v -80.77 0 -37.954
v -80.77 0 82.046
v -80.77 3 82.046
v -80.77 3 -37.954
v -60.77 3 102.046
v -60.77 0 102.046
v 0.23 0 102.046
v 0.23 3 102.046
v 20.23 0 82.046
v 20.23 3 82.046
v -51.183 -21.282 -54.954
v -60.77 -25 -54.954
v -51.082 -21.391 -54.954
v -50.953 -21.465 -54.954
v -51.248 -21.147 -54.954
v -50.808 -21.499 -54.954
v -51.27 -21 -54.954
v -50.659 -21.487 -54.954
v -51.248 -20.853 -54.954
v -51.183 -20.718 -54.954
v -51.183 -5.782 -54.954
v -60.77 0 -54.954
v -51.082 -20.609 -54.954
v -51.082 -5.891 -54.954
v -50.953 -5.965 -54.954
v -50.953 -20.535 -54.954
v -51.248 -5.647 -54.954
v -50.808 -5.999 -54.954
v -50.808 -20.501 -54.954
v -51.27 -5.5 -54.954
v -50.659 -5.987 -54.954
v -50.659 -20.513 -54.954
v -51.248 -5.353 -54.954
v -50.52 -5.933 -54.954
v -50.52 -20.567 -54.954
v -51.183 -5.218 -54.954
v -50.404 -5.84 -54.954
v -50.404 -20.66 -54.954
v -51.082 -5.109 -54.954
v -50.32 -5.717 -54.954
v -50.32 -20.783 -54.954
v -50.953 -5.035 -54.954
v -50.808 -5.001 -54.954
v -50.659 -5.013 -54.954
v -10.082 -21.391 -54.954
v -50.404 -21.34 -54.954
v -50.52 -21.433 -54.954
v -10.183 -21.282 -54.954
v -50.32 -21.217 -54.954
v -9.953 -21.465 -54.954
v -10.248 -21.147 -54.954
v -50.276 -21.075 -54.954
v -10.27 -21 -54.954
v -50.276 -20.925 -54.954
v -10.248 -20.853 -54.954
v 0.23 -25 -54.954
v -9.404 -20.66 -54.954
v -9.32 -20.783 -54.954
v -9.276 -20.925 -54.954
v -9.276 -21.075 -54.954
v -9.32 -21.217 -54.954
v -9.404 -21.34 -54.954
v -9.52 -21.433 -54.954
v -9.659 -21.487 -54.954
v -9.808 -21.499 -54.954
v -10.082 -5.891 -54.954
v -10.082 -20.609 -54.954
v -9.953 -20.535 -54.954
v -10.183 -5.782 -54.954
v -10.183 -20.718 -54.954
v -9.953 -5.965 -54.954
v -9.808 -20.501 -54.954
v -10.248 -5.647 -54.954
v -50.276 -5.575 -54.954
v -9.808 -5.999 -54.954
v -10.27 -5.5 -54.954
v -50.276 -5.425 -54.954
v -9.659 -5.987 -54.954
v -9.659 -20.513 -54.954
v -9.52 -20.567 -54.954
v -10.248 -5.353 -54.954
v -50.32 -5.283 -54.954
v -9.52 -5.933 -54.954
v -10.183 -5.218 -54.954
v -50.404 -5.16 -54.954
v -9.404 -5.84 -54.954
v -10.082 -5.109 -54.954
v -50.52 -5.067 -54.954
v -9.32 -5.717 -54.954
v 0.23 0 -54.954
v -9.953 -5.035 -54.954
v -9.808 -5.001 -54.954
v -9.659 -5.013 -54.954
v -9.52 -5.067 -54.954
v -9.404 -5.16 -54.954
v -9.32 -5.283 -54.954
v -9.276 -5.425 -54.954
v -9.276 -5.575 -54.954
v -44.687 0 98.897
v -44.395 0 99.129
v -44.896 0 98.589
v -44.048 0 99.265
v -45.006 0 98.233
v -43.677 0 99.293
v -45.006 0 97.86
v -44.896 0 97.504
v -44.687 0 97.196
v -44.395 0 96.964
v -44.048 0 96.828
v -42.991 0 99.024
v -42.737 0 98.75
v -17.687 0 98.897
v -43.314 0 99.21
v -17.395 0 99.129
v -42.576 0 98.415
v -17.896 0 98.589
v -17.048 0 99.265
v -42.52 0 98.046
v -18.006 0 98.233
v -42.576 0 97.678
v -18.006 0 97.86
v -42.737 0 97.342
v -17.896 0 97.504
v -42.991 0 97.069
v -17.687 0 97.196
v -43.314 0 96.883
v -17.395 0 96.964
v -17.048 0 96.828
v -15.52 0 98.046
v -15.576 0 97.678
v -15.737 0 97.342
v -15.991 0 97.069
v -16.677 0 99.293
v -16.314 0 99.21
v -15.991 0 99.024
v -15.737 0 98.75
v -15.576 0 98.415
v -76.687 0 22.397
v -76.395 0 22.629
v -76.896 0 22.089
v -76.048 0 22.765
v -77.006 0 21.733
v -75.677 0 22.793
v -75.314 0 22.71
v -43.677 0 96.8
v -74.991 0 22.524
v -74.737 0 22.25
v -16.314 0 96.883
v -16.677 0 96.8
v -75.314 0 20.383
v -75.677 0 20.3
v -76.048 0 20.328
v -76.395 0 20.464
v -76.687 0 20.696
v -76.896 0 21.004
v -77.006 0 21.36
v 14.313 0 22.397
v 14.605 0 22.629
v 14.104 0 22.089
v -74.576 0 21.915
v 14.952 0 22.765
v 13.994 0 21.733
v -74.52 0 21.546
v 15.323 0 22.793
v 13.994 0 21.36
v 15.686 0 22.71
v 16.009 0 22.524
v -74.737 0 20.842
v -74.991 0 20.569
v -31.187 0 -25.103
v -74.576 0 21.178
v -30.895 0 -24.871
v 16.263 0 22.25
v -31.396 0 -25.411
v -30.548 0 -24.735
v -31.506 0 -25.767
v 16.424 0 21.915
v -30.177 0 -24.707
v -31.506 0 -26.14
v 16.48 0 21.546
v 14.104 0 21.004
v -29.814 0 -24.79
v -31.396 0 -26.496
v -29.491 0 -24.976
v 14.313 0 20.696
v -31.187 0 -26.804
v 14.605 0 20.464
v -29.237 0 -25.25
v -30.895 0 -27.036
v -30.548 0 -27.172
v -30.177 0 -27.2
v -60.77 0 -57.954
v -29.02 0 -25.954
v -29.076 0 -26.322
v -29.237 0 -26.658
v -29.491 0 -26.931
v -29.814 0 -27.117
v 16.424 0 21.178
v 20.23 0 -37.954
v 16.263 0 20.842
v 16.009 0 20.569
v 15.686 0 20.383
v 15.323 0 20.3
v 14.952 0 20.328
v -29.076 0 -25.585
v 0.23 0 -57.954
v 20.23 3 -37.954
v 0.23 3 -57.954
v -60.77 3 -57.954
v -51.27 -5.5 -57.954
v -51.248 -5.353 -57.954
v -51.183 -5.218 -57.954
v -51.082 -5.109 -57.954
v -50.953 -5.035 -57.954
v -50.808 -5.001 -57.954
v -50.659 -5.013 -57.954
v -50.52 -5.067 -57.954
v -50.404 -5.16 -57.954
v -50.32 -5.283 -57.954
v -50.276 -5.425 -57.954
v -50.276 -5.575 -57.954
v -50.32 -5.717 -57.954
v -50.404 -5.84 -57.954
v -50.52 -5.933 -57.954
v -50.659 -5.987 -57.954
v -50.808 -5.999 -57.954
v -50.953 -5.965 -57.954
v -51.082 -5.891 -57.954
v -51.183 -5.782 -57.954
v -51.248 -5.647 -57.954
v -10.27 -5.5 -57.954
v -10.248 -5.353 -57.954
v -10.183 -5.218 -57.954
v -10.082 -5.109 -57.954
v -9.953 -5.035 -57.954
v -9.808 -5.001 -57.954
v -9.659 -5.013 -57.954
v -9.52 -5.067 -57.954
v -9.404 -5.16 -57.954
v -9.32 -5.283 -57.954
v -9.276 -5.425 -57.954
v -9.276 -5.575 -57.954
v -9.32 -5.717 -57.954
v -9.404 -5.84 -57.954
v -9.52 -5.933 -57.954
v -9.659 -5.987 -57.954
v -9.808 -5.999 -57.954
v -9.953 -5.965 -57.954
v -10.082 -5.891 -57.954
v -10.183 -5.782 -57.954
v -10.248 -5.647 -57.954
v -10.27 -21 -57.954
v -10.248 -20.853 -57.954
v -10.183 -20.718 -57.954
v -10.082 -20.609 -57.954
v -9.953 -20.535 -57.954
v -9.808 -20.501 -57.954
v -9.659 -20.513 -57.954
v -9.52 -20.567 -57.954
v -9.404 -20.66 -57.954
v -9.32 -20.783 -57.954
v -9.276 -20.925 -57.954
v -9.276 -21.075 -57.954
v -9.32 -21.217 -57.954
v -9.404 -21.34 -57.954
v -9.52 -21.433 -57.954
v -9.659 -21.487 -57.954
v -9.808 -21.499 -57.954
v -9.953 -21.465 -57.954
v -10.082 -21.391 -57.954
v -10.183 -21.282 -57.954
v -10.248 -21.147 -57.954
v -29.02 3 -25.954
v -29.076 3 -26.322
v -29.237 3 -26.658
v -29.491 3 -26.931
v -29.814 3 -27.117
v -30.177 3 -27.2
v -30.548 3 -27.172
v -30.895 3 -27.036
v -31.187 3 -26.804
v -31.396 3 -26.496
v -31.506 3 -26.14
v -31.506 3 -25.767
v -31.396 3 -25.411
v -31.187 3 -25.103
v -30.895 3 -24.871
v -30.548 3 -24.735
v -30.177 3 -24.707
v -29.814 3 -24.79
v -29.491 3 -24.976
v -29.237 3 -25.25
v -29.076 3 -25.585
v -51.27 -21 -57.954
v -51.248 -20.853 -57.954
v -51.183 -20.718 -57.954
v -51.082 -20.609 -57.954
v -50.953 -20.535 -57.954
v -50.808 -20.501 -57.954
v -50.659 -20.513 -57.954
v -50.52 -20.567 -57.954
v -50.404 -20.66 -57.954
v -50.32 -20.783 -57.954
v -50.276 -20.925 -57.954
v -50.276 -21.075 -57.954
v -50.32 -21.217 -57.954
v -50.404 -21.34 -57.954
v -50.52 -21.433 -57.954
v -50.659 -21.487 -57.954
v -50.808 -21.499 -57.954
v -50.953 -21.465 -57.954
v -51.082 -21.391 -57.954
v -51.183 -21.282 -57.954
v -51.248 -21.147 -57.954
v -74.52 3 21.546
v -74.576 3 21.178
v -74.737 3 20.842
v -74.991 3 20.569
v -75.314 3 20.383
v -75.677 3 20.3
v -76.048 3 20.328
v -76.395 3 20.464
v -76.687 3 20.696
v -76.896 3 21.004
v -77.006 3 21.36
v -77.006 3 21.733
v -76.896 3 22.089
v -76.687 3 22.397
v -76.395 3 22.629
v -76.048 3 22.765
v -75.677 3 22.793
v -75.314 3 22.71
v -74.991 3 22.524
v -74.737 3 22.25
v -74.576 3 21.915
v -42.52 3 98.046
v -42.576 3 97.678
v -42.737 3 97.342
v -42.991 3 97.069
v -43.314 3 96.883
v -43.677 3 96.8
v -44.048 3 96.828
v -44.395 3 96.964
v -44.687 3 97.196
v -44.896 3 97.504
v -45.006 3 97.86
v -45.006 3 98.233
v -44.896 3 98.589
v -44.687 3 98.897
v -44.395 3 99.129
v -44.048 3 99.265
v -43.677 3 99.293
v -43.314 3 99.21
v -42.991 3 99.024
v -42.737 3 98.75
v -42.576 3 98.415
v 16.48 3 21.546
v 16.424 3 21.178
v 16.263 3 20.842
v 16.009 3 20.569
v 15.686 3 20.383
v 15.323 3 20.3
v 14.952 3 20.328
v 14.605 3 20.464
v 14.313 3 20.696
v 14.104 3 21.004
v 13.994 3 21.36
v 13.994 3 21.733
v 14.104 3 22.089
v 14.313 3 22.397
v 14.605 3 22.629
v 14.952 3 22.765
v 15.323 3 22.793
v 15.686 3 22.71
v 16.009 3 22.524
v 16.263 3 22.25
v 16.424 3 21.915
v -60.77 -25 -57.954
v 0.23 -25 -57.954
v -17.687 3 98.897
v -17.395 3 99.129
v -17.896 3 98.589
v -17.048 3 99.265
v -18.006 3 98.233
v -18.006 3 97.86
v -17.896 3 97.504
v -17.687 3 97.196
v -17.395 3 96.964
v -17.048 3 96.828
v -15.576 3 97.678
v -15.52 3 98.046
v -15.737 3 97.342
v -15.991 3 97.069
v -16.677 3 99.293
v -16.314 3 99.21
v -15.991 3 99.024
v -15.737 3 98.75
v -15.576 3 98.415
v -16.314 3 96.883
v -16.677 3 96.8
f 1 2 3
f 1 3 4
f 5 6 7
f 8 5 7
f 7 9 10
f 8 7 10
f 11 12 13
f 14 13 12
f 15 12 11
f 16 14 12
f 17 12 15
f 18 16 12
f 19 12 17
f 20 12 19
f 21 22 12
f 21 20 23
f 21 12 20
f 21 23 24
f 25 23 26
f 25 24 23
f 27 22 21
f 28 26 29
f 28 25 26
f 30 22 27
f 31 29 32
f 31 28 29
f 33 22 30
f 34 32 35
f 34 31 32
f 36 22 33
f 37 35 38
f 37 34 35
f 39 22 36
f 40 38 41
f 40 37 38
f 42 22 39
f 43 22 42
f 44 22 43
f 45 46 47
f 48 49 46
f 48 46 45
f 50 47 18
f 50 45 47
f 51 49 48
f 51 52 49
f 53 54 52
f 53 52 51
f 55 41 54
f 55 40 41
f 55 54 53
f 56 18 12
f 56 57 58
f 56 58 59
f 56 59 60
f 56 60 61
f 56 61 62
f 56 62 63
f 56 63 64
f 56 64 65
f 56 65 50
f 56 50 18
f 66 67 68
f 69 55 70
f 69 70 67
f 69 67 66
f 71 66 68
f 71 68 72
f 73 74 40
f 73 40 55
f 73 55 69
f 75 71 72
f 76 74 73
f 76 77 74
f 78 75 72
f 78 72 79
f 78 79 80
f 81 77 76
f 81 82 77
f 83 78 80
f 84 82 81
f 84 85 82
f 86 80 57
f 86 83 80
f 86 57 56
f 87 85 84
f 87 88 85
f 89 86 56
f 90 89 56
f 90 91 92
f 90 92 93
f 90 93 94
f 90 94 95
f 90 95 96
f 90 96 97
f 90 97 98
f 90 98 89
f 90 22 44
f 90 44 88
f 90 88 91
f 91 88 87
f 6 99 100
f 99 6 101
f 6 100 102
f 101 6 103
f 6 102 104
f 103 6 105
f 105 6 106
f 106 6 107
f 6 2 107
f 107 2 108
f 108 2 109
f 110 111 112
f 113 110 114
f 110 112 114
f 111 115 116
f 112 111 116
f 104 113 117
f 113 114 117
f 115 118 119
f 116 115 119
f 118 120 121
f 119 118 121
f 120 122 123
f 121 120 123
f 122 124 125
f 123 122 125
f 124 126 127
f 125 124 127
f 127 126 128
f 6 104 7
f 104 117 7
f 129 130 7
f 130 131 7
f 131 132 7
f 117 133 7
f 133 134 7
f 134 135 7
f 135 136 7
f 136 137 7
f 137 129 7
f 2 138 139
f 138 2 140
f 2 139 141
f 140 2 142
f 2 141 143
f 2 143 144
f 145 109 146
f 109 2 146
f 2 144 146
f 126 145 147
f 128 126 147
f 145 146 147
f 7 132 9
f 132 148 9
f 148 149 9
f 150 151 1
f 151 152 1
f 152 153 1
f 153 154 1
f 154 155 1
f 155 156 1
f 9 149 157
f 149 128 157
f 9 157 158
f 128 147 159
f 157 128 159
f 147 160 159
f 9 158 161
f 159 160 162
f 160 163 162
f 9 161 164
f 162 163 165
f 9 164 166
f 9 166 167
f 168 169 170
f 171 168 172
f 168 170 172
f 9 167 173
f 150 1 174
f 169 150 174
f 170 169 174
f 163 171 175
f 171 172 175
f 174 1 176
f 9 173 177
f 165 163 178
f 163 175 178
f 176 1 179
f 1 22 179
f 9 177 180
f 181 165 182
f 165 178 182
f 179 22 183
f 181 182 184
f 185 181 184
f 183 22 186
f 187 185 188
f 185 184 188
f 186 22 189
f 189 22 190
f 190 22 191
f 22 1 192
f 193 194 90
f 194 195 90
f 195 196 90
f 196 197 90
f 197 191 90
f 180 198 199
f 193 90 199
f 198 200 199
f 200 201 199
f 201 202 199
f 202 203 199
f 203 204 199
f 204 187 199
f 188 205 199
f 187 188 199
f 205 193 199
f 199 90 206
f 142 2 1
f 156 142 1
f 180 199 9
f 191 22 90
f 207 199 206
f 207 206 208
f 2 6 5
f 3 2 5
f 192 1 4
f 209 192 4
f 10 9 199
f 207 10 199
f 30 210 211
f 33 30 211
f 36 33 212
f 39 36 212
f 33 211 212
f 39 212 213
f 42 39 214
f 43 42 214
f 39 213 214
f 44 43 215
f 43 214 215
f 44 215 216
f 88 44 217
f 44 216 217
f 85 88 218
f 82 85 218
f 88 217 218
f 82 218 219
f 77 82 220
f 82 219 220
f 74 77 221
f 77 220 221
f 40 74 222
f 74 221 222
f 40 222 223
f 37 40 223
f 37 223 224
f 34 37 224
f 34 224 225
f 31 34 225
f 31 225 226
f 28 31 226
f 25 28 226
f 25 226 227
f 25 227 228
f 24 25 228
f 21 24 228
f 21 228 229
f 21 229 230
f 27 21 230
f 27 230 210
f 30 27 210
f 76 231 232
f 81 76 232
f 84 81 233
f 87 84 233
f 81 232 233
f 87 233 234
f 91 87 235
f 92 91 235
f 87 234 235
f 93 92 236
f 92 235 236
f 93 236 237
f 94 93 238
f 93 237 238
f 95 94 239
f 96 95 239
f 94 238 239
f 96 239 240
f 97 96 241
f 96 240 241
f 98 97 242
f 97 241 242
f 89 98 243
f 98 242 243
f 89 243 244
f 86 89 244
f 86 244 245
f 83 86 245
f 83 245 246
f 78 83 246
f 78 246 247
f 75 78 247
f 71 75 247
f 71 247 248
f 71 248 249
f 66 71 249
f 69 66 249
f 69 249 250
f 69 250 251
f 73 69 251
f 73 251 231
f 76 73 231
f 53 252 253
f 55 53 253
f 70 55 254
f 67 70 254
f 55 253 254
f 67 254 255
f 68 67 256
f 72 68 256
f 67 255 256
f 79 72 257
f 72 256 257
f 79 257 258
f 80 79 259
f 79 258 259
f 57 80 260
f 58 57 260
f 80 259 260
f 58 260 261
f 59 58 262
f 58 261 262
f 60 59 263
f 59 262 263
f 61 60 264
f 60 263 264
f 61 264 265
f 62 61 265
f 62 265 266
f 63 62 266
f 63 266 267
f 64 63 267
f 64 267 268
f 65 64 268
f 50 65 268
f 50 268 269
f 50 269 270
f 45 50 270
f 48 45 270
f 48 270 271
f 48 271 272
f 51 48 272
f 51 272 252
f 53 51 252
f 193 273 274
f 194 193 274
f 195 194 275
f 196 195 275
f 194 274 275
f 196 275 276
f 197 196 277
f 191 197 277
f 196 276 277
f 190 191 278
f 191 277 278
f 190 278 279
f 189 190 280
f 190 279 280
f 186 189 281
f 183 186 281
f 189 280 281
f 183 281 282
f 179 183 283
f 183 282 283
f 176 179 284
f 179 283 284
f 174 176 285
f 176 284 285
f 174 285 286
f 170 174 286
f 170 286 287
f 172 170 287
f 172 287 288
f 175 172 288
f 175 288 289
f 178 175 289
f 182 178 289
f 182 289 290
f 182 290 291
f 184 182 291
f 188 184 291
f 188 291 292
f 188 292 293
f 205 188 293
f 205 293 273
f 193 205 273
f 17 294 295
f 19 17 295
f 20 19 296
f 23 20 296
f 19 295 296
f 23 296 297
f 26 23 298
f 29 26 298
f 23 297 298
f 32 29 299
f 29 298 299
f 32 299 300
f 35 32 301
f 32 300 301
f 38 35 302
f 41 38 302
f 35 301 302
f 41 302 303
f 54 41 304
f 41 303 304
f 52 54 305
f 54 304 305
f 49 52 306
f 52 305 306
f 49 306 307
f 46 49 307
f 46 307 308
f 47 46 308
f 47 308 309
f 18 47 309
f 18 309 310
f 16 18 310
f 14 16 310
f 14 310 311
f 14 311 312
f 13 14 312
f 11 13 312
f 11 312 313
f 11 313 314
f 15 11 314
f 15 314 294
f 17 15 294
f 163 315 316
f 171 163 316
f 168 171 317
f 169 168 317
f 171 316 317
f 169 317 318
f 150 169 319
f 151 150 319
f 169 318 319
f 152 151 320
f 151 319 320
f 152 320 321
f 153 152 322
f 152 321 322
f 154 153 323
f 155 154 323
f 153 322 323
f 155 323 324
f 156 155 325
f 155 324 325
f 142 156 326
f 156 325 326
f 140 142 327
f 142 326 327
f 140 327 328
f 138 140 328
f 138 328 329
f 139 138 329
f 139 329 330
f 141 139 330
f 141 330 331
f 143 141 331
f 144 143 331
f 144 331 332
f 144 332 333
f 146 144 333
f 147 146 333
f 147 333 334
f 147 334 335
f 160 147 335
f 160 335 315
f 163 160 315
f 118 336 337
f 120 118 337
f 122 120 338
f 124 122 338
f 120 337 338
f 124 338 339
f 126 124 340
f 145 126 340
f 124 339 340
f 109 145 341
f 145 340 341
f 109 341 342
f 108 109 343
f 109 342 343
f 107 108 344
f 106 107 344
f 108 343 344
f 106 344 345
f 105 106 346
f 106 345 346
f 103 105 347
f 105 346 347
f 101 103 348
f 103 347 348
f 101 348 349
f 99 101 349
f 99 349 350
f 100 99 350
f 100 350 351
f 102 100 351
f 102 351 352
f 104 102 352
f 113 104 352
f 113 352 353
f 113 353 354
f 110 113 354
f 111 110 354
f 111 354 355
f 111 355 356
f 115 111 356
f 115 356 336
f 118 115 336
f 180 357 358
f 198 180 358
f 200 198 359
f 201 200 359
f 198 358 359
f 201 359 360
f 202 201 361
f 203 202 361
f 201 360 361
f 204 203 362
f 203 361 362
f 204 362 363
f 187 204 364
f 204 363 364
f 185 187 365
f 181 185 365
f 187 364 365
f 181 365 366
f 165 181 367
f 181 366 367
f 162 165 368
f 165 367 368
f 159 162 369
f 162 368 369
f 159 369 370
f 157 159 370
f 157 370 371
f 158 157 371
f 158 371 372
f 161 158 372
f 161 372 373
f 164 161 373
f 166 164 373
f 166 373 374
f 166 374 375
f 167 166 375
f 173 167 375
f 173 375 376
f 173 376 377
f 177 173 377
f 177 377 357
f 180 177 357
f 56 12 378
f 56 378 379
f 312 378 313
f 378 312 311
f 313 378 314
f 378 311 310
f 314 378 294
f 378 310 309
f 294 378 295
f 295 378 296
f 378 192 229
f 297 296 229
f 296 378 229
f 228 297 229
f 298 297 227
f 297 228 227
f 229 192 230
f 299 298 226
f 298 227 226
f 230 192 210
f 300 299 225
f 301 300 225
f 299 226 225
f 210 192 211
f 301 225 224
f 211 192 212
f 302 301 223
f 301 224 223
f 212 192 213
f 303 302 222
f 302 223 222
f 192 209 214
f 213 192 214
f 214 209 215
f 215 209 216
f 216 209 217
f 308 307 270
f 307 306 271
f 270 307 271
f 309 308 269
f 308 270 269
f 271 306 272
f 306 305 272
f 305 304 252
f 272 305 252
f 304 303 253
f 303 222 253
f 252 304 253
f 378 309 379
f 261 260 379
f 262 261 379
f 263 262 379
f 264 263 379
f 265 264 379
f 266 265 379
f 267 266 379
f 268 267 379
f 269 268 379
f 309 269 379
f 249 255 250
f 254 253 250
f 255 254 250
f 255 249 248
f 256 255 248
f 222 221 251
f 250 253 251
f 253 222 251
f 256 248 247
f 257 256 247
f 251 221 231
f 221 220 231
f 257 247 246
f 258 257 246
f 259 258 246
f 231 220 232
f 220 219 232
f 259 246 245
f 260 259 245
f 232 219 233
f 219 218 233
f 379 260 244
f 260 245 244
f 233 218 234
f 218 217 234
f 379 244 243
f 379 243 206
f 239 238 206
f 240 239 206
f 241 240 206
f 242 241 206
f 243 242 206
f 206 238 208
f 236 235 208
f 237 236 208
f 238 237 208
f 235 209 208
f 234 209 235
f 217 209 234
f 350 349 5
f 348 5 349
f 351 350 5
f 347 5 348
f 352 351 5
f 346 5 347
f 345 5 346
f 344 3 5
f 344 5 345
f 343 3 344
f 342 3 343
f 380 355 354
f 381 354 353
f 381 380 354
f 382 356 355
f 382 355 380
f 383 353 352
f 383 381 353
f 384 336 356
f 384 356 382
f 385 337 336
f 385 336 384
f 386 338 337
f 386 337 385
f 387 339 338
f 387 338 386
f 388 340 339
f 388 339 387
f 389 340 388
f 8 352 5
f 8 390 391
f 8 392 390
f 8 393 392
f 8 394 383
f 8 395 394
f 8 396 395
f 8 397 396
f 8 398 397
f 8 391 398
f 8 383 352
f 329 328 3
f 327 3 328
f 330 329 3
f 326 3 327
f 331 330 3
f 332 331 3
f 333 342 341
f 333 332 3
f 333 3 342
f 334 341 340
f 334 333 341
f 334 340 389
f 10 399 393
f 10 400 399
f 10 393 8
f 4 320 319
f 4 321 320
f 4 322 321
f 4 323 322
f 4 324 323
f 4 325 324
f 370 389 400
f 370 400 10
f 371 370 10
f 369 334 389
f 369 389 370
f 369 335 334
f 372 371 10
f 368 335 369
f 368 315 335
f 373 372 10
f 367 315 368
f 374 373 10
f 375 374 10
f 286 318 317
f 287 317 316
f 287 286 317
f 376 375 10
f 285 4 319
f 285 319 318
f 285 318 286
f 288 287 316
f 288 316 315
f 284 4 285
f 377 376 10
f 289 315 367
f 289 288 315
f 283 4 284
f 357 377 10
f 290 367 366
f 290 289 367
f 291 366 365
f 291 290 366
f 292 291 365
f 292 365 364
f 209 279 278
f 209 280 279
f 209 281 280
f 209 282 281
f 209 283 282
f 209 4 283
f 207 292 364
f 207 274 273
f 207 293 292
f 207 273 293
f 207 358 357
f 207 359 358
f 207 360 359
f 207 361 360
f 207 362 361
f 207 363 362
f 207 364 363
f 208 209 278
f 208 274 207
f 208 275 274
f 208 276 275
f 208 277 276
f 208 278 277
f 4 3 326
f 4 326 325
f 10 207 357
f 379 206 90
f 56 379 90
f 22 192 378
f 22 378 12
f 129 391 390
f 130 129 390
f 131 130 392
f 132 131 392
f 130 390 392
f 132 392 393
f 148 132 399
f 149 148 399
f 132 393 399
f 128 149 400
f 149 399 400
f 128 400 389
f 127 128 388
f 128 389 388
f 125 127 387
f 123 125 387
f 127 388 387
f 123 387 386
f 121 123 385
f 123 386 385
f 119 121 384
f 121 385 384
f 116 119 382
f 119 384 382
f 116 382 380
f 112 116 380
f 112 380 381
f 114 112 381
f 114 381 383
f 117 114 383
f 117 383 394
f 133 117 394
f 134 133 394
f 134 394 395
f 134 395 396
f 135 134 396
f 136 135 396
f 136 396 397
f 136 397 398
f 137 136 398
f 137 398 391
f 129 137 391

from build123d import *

# Parameters (mm, degrees)
ESBO_O1_W                = 101
ESBO_O1_H                = 160
RESSALTO_EXTRUS_O1_DEPTH = 3
ESBO_O2_R                = 1.25
CORTE_EXTRUS_O1_DEPTH    = 140
CHANFRO1_SIZE            = 20
ESBO_O3_W                = 61
ESBO_O3_H                = 3
RESSALTO_EXTRUS_O2_DEPTH = 25
ESBO_O4_R                = 0.5
CORTE_EXTRUS_O2_DEPTH    = 25


with BuildPart() as part:
    # Esboço1 → Ressalto-extrusão1 (new body)
    with BuildSketch(Plane(origin=(0, 0, 0), x_dir=(1, 0, 0), z_dir=(0, 1, 0))):
        with Locations((-30.270258535, -22.046326637)):
            Rectangle(ESBO_O1_W, ESBO_O1_H)
    extrude(amount=RESSALTO_EXTRUS_O1_DEPTH)

    # Esboço2 → Corte-extrusão1 (cut)
    with BuildSketch(Plane(origin=(0, 3, 0), x_dir=(1, 0, 0), z_dir=(0, 1, 0))):
        with Locations((15.229741465, -21.546326637)):
            Circle(ESBO_O2_R)
        with Locations((-75.770258535, -21.546326637)):
            Circle(ESBO_O2_R)
        with Locations((-30.270258535, 25.953673363)):
            Circle(ESBO_O2_R)
        with Locations((-43.770258535, -98.046326637)):
            Circle(ESBO_O2_R)
        with Locations((-16.770258535, -98.046326637)):
            Circle(ESBO_O2_R)
    extrude(amount=-CORTE_EXTRUS_O1_DEPTH, mode=Mode.SUBTRACT)

    # Chanfro1
    chanfro1_edges = [part.edges().sort_by_distance(p)[0] for p in [
        (-80.770258535, 1.5, -57.953673363),
        (20.229741465, 1.5, -57.953673363),
        (20.229741465, 1.5, 102.046326637),
        (-80.770258535, 1.5, 102.046326637),
    ]]
    chamfer(chanfro1_edges, length=CHANFRO1_SIZE)

    # Esboço3 → Ressalto-extrusão2 (add)
    with BuildSketch(Plane.XZ):
        with Locations((-30.270258535, -56.453673363)):
            Rectangle(ESBO_O3_W, ESBO_O3_H)
    extrude(amount=RESSALTO_EXTRUS_O2_DEPTH)

    # Esboço4 → Corte-extrusão2 (cut)
    with BuildSketch(Plane(origin=(0, 0, -57.953673363), x_dir=(-1, 0, 0), z_dir=(0, 0, -1))):
        with Locations((9.770258535, -5.5)):
            Circle(ESBO_O4_R)
        with Locations((50.770258535, -21)):
            Circle(ESBO_O4_R)
        with Locations((9.770258535, -21)):
            Circle(ESBO_O4_R)
        with Locations((50.770258535, -5.5)):
            Circle(ESBO_O4_R)
    extrude(amount=-CORTE_EXTRUS_O2_DEPTH, mode=Mode.SUBTRACT)


solid = part.part
